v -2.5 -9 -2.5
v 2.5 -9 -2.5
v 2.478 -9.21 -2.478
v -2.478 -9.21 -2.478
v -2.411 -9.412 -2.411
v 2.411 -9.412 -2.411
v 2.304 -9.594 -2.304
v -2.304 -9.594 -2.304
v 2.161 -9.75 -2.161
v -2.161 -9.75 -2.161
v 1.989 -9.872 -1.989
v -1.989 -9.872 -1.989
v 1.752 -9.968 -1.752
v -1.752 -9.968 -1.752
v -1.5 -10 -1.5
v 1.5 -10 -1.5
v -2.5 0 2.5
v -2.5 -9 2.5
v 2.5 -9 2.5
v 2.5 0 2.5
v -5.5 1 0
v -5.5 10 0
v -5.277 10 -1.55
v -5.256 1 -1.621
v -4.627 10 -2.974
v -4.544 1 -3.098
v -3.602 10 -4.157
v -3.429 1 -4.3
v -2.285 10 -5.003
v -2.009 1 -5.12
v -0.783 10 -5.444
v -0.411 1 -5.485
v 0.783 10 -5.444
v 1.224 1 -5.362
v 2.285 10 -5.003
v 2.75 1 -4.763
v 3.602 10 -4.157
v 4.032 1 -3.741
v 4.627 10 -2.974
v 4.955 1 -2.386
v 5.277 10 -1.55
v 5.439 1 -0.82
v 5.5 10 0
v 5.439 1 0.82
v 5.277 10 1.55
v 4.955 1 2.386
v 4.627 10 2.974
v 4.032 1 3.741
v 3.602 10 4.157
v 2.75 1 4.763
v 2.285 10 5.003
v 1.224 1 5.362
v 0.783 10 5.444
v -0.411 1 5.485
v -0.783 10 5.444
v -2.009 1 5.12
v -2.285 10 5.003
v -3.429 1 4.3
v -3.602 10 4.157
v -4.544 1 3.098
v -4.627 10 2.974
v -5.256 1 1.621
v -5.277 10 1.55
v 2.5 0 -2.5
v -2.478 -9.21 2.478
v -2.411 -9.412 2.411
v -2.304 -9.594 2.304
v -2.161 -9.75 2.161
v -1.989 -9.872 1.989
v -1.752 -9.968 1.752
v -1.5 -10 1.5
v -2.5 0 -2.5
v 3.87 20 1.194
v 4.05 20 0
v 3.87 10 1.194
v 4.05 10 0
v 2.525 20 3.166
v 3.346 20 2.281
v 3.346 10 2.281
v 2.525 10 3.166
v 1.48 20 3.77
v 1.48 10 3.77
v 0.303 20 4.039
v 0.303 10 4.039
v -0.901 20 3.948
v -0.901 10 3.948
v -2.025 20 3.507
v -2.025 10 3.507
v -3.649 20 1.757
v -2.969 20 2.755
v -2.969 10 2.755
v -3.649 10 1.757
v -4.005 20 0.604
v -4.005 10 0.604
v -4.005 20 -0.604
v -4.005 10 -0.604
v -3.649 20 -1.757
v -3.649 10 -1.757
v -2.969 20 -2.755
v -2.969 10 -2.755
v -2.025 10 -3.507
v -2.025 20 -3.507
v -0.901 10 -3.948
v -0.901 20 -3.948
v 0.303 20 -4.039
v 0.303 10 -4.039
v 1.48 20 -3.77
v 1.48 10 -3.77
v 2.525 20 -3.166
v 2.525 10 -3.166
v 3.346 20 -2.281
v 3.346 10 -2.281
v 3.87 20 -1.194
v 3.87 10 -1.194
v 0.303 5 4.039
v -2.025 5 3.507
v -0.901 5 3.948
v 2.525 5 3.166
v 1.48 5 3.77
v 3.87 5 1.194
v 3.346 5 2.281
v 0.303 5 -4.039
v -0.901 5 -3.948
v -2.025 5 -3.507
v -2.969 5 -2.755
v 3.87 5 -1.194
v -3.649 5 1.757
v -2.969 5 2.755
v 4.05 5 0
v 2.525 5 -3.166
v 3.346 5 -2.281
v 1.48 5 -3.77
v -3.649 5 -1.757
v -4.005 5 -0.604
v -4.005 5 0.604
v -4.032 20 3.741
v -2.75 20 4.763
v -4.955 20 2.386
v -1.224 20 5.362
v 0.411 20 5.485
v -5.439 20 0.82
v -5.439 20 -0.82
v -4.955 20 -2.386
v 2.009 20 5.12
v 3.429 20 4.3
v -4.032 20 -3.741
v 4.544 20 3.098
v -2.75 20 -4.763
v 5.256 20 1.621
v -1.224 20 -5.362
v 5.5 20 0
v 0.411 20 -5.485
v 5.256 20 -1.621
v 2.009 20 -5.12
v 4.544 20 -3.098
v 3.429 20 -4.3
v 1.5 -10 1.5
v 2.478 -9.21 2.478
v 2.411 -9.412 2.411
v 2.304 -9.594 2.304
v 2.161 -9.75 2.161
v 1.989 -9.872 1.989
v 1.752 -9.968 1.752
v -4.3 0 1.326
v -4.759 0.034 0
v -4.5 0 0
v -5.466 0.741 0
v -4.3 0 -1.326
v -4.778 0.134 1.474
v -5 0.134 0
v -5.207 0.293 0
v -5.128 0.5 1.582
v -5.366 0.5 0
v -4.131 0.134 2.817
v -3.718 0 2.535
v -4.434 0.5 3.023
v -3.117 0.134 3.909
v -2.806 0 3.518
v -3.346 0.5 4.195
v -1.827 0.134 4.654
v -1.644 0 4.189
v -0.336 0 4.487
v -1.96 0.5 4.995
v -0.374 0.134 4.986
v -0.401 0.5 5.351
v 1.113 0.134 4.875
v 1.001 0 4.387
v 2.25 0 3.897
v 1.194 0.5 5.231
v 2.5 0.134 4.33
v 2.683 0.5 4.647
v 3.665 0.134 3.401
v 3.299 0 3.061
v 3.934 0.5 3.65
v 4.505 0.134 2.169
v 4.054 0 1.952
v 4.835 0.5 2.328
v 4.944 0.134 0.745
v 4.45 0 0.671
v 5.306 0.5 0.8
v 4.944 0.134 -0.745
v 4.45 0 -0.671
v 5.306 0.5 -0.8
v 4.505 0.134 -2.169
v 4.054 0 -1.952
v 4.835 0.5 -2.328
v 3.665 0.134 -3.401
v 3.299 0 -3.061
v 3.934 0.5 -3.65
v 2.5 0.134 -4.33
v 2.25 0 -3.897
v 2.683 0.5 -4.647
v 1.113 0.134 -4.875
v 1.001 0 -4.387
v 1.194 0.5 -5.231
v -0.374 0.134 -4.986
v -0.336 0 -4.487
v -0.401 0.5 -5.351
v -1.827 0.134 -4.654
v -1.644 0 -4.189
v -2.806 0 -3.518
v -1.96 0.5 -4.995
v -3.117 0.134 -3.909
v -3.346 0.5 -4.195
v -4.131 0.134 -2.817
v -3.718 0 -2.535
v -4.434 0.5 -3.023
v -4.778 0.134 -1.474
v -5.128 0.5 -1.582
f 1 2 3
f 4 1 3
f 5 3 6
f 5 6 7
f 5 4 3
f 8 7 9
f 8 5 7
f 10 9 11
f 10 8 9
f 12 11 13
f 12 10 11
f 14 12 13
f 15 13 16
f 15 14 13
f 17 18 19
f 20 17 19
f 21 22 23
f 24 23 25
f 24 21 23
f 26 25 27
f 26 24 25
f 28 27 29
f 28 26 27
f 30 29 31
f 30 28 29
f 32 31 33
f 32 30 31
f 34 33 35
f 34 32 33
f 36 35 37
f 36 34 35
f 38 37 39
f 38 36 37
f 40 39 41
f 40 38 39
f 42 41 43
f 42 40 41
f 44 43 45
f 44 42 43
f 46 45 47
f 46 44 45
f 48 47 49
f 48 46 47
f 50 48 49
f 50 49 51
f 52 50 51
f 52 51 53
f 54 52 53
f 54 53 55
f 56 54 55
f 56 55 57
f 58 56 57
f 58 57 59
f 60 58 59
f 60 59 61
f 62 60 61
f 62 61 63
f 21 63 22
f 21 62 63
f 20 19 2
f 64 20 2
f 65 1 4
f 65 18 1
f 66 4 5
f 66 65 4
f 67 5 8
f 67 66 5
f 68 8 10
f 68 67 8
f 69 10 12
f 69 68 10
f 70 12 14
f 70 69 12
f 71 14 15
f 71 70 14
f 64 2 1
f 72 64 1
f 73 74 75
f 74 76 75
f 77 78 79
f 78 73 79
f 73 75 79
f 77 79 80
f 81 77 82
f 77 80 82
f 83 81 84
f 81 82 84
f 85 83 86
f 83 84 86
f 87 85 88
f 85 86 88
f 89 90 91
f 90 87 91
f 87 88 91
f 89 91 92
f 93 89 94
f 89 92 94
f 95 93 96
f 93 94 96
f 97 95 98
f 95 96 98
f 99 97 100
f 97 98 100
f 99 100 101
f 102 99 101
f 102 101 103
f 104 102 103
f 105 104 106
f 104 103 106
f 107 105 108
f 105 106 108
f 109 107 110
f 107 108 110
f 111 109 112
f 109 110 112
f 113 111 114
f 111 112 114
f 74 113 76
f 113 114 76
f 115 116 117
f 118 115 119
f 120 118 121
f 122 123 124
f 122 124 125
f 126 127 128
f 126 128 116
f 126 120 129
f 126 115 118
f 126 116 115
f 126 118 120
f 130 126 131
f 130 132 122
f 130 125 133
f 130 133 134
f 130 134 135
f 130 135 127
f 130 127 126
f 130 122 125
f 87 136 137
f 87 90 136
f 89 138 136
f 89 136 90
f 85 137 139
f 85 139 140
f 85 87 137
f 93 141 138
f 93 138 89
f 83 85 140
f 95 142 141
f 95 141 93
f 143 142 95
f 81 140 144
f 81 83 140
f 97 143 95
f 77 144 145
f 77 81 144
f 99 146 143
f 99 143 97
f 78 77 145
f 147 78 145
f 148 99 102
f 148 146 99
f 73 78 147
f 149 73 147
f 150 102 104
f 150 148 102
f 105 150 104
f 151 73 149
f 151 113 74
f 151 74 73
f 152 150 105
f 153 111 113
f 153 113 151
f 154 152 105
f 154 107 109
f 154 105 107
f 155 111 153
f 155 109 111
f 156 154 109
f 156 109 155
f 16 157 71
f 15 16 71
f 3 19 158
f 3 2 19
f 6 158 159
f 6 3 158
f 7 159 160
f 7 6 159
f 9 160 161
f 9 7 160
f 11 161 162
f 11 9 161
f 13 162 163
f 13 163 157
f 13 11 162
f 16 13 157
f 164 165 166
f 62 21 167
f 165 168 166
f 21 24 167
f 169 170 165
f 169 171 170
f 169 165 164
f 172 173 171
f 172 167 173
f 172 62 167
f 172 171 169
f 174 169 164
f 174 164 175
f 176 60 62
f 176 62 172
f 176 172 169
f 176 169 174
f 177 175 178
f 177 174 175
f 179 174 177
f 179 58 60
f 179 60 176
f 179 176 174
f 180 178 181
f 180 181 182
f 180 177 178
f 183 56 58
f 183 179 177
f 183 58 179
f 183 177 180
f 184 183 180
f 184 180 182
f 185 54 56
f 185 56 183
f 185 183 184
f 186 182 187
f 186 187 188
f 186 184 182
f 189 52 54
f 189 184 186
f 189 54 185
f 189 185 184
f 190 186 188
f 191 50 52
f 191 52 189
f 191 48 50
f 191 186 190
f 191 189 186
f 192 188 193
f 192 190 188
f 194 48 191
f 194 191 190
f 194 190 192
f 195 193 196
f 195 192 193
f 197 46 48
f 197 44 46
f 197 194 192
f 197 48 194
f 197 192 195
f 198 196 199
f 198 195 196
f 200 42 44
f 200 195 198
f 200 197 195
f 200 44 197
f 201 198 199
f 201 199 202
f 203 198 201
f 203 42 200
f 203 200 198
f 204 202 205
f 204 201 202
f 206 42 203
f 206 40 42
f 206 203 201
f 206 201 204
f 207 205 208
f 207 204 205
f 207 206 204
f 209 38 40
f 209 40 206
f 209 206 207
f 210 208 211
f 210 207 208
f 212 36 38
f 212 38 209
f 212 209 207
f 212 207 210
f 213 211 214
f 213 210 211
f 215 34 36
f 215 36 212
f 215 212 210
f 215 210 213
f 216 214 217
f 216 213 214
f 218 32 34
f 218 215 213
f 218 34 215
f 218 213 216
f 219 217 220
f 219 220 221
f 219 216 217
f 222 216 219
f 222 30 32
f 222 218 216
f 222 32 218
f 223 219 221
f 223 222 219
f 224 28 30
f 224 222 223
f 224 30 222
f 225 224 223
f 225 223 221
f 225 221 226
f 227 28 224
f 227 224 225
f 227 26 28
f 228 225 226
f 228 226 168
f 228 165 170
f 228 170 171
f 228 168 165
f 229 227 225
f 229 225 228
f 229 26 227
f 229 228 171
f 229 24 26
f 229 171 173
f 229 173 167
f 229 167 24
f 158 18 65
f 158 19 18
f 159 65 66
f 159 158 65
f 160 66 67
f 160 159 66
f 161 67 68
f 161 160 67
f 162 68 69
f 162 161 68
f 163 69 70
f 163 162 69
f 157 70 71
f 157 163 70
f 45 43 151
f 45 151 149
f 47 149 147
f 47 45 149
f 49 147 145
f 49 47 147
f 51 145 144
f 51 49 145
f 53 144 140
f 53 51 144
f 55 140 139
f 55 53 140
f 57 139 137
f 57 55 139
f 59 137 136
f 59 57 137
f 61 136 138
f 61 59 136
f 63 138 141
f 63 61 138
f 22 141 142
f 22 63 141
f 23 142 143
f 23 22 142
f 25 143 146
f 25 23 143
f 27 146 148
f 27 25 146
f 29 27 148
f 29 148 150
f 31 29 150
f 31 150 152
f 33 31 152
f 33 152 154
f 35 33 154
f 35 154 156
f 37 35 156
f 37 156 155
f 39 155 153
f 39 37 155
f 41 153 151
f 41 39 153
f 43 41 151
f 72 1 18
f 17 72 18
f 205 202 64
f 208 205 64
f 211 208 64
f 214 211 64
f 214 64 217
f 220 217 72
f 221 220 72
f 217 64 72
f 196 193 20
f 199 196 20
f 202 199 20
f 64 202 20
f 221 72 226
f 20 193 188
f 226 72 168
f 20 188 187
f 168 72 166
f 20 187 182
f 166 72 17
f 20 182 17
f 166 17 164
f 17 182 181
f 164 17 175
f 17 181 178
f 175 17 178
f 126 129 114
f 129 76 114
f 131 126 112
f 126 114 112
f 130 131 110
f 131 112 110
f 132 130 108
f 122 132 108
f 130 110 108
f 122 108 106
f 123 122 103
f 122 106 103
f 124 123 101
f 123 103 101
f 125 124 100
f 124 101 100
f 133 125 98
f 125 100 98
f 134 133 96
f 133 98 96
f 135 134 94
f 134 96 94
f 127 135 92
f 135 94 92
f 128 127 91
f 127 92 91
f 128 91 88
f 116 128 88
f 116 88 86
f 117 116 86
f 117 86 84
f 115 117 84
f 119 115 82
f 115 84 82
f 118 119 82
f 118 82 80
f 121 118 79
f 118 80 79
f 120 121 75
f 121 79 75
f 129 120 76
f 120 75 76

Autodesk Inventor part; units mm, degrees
ref_plane "YZ Plane" through (0, 0, 0) normal (1, 0, 0) x (0, 1, 0)
ref_plane "XZ Plane" through (0, 0, 0) normal (0, 1, 0) x (-1, 0, 0)
ref_plane "XY Plane" through (0, 0, 0) normal (0, 0, 1) x (1, 0, 0)
sketch "Sketch1" plane through (0, 0, 0) normal (0, 1, 0) x (-1, 0, 0)
  circle A0 centre (0, 0) radius 5.5
  line L0 (2.5, 2.5) -> (-2.5, 2.5)
  line L1 (-2.5, 2.5) -> (-2.5, -2.5)
  line L2 (-2.5, -2.5) -> (2.5, -2.5)
  line L3 (2.5, -2.5) -> (2.5, 2.5)
  line L4 (2.5, 2.5) -> (-2.5, -2.5) construction
  line L5 (-2.5, 2.5) -> (2.5, -2.5) construction
  dimension "d0" = 11
  dimension "d3" = 5
  dimension "d4" = 5
extrude "Extrusion1" add sketch "Sketch1" along normal blind 10 contours A0 | L3 L2 L1 L0
extrude "Extrusion2" add sketch "Sketch1" against normal blind 10 contours L3 L2 L1 L0
fillet "Fillet1" radius 1 4 edges at (0, -10, -2.5) (-2.5, -10, 0) (0, -10, 2.5) (2.5, -10, 0)
fillet "Fillet2" radius 1 1 edges at (5.5, 0, 0)
sketch "Sketch2" plane through (0, 10, 0) normal (0, 1, 0) x (1, 0, 0)
  circle A0 centre (0, 0) radius 4.05
  circle A1 centre (0, 0) radius 5.5
  dimension "d9" = 8.1
  dimension "d10" = 11
extrude "Extrusion3" cut sketch "Sketch2" against normal blind 5 contours A0
sketch "Sketch3" plane through (0, 10, 0) normal (0, 1, 0) x (1, 0, 0)
  point P0 (0, 0)
sketch "Sketch4" plane through (0, 10, 0) normal (0, 1, 0) x (1, 0, 0)
  circle A0 centre (0, 0) radius 5.5
  circle A1 centre (0, 0) radius 4.05
  dimension "d13" = 11
extrude "Extrusion4" add sketch "Sketch4" along normal blind 10
properties part number "nut a"
